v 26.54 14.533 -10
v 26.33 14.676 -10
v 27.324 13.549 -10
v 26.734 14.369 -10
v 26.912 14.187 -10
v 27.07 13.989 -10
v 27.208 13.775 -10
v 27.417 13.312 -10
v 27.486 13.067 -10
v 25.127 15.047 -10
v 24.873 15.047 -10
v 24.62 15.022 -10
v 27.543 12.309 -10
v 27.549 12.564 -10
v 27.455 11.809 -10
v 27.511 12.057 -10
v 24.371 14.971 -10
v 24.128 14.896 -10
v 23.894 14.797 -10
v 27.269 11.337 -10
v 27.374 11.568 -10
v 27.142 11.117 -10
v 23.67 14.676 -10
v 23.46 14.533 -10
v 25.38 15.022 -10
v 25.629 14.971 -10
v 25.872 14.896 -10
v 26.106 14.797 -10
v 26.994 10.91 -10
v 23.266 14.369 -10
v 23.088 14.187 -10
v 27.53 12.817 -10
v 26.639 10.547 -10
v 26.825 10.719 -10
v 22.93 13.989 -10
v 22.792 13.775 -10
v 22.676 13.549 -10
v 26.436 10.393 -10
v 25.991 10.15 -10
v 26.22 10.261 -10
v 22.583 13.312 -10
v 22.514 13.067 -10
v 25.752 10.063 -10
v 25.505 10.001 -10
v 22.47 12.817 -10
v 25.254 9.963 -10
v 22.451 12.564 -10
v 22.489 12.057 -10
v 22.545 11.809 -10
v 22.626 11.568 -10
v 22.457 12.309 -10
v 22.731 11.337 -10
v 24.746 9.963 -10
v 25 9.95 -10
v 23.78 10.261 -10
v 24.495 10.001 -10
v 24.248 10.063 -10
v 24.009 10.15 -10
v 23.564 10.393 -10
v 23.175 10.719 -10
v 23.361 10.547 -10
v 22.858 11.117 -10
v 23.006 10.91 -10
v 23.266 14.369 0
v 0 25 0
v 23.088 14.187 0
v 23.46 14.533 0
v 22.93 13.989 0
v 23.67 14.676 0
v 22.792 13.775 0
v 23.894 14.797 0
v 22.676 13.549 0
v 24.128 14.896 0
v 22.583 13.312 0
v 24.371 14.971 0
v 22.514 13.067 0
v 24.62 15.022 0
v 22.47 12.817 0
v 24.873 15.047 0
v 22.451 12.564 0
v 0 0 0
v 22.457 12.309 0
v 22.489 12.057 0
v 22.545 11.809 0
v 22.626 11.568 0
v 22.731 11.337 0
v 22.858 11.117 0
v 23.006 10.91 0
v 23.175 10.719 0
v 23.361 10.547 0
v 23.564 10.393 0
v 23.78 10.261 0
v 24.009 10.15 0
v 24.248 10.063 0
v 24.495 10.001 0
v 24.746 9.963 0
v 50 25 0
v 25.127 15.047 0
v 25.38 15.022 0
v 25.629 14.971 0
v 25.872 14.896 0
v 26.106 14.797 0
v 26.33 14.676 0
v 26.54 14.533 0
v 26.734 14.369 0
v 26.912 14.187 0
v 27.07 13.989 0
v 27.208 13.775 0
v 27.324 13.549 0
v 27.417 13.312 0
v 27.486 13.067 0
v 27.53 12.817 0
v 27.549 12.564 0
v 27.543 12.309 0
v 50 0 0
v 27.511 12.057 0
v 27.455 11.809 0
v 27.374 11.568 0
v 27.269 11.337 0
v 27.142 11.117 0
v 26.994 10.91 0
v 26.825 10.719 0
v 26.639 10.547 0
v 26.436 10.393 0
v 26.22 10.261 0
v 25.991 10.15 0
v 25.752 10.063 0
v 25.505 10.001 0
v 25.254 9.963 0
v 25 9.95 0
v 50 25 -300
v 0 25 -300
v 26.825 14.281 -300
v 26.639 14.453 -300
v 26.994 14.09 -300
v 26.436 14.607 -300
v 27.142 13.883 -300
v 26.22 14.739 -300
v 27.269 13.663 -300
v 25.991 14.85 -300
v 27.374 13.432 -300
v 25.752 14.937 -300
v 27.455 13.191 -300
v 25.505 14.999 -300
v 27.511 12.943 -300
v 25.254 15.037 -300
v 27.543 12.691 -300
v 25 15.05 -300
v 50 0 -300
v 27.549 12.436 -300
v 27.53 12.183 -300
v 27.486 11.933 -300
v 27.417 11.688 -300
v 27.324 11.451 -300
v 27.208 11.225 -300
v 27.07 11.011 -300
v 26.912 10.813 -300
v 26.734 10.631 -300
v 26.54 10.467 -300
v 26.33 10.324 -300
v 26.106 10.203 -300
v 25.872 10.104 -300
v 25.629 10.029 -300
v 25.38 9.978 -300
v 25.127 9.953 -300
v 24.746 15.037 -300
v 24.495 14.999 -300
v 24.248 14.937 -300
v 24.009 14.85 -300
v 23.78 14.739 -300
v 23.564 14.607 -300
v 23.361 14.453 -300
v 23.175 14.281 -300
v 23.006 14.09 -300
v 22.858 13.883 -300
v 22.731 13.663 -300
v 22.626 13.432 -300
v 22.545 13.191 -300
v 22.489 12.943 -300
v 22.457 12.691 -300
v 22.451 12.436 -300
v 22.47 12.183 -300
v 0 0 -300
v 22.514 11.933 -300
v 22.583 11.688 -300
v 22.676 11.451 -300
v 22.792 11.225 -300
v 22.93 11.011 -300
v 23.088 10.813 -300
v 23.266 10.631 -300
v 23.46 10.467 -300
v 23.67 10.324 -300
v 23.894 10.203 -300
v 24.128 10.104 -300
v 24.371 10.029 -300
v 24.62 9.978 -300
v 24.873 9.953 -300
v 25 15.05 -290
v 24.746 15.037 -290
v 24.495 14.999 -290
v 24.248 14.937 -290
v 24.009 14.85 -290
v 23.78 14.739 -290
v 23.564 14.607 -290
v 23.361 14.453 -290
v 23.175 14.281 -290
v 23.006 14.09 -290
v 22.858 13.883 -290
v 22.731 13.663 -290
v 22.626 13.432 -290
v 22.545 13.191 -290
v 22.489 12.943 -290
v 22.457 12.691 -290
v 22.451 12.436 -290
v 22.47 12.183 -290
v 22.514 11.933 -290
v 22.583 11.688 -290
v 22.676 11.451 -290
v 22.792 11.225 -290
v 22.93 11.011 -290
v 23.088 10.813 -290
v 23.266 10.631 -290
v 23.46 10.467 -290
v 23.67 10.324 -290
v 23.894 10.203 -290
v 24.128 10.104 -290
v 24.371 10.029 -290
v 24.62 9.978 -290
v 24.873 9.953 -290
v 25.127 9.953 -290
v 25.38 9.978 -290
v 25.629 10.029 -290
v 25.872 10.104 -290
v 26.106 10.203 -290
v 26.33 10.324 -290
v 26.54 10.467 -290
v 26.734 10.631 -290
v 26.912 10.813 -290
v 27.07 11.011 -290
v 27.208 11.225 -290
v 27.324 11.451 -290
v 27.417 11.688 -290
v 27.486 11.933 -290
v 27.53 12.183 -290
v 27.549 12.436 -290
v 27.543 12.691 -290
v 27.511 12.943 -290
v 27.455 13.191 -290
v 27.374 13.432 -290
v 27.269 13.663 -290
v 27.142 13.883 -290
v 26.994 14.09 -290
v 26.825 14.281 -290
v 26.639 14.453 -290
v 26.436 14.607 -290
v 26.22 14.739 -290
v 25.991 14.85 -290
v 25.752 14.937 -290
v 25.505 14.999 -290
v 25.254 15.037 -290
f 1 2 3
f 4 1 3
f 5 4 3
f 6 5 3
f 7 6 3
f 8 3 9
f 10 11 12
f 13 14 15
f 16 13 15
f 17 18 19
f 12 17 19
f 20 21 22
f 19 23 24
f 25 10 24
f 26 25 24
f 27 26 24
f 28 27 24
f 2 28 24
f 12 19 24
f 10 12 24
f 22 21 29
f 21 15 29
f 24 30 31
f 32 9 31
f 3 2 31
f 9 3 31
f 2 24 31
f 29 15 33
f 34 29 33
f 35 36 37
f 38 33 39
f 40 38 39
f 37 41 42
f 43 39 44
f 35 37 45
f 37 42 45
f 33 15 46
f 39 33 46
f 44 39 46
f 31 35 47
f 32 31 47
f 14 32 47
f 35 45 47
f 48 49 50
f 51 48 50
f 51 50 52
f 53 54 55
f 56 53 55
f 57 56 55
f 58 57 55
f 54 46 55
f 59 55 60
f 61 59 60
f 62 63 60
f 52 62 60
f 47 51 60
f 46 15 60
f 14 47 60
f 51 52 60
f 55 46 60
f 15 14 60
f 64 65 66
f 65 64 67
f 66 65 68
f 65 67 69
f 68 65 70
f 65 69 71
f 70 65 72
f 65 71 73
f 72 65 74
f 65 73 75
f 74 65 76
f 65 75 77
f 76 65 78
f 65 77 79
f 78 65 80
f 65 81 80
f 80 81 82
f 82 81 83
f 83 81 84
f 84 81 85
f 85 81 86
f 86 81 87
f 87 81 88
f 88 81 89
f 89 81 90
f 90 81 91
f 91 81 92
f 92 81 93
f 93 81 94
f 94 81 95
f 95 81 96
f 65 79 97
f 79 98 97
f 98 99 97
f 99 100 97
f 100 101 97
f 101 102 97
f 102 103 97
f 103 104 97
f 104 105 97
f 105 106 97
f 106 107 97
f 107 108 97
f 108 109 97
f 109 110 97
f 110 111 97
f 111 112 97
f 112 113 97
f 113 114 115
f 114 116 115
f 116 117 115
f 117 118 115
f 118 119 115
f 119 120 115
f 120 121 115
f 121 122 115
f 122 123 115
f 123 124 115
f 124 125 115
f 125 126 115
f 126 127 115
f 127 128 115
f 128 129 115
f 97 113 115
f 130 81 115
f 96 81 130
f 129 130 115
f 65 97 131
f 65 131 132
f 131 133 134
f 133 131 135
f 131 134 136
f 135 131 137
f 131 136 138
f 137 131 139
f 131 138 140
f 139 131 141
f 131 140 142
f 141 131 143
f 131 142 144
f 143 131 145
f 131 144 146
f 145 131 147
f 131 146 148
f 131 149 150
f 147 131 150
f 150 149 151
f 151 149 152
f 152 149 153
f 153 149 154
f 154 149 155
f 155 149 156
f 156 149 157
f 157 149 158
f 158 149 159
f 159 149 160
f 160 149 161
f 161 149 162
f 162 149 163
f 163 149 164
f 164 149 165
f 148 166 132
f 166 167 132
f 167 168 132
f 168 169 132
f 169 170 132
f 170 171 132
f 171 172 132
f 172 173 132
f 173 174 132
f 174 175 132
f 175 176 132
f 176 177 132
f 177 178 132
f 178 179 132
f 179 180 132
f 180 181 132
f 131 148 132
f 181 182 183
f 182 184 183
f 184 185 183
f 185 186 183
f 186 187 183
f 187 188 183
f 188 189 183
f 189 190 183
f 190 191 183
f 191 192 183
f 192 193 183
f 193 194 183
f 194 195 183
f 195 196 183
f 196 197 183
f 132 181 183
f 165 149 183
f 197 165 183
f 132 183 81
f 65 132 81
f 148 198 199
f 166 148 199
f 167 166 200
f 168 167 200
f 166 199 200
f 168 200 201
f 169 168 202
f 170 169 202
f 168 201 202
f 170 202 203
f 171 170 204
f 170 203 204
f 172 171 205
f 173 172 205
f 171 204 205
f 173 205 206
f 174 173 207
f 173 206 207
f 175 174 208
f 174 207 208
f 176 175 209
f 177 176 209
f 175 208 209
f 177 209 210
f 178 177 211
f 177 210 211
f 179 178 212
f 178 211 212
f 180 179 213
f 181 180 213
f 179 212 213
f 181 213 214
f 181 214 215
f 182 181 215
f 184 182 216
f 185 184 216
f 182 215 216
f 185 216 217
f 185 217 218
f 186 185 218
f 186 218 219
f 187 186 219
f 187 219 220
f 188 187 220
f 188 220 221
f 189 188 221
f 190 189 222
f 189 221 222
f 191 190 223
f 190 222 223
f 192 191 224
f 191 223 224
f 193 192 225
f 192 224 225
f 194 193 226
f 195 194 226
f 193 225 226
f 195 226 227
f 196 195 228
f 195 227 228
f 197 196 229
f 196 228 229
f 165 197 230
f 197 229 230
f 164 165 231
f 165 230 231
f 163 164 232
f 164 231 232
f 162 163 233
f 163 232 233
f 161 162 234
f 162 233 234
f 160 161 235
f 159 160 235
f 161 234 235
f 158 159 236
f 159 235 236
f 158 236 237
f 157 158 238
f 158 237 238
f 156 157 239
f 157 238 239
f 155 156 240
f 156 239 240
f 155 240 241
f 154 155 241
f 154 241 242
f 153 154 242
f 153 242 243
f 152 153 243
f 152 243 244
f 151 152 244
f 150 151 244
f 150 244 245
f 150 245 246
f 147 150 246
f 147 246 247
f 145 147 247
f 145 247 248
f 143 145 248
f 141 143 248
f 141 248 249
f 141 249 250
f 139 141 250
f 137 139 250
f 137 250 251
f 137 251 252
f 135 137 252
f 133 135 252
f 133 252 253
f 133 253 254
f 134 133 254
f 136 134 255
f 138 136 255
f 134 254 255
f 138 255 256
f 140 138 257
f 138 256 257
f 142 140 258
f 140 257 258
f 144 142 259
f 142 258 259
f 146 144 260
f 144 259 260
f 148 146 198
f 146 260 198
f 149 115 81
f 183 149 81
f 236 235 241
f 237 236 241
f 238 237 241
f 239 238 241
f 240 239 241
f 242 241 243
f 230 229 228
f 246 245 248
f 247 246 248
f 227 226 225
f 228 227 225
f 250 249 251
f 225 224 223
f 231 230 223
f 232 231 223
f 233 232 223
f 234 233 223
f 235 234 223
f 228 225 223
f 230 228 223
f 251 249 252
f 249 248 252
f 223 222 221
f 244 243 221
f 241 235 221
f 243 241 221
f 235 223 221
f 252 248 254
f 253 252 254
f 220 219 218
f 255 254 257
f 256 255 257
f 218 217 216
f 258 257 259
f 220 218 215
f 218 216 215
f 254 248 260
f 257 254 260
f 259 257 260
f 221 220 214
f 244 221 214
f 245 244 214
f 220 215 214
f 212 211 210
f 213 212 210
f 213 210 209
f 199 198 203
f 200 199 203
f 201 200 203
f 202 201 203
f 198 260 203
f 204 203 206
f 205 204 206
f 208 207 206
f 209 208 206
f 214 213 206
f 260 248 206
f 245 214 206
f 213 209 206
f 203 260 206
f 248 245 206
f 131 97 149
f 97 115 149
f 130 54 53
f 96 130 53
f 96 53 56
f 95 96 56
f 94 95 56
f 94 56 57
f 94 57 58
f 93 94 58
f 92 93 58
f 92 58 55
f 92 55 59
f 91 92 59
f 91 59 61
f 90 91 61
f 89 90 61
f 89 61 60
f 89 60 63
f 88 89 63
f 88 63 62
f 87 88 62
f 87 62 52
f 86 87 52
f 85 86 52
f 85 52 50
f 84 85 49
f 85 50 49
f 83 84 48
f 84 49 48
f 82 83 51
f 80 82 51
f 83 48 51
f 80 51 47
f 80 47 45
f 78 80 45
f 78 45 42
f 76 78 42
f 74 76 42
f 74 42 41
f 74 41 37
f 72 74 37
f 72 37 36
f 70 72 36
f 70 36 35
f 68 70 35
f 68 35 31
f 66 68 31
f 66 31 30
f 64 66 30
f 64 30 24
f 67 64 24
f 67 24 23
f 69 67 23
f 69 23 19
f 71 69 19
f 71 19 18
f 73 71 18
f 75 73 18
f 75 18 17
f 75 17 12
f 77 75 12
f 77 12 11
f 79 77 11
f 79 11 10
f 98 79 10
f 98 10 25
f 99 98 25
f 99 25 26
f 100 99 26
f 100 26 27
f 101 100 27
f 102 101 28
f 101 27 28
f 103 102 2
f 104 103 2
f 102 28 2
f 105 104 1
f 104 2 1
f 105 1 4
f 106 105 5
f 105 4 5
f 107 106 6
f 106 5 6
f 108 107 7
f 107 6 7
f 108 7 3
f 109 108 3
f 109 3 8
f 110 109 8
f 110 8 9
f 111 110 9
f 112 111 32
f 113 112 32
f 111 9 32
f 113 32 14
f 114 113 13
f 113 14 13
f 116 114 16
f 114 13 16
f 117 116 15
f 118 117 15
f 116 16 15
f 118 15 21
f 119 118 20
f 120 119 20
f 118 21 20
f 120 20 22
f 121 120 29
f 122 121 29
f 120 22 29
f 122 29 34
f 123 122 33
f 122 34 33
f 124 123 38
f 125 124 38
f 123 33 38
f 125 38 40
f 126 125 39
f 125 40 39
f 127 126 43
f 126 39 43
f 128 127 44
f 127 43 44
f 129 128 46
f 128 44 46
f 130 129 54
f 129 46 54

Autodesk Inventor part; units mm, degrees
ref_plane "YZ Plane" through (0, 0, 0) normal (1, 0, 0) x (0, 1, 0)
ref_plane "XZ Plane" through (0, 0, 0) normal (0, 1, 0) x (-1, 0, 0)
ref_plane "XY Plane" through (0, 0, 0) normal (0, 0, 1) x (1, 0, 0)
sketch "スケッチ1" plane through (0, 0, 0) normal (0, 1, 0) x (-1, 0, 0)
  line L0 (0, 0) -> (-50, 0)
  line L1 (-50, 0) -> (-50, -300)
  line L2 (-50, -300) -> (0, -300)
  line L3 (0, -300) -> (0, 0)
  dimension "d0" = 50
  dimension "d1" = 300
extrude "押し出し1" add sketch "スケッチ1" along normal blind 25
ref_plane "作業平面1" through (0, 0, 0) normal (0, 0, 1) x (1, 0, 0)
sketch "スケッチ2" plane through (0, 0, 0) normal (0, 0, 1) x (1, 0, 0)
  point P0 (0, 0)
  point P1 (25, 12.5)
ref_plane "作業平面2" through (50, 0, -300) normal (0, 0, -1) x (-1, 0, 0)
sketch "スケッチ3" plane through (50, 0, -300) normal (0, 0, -1) x (-1, 0, 0)
  point P0 (50, 0)
  point P1 (25, 12.5)
hole "穴1" at (25, 12.5, -300) direction (0, 0, 1) diameter 5.1 depth 10
hole "穴2" at (25, 12.5, 0) direction (0, 0, -1) diameter 5.1 depth 10
properties part number "block1"
